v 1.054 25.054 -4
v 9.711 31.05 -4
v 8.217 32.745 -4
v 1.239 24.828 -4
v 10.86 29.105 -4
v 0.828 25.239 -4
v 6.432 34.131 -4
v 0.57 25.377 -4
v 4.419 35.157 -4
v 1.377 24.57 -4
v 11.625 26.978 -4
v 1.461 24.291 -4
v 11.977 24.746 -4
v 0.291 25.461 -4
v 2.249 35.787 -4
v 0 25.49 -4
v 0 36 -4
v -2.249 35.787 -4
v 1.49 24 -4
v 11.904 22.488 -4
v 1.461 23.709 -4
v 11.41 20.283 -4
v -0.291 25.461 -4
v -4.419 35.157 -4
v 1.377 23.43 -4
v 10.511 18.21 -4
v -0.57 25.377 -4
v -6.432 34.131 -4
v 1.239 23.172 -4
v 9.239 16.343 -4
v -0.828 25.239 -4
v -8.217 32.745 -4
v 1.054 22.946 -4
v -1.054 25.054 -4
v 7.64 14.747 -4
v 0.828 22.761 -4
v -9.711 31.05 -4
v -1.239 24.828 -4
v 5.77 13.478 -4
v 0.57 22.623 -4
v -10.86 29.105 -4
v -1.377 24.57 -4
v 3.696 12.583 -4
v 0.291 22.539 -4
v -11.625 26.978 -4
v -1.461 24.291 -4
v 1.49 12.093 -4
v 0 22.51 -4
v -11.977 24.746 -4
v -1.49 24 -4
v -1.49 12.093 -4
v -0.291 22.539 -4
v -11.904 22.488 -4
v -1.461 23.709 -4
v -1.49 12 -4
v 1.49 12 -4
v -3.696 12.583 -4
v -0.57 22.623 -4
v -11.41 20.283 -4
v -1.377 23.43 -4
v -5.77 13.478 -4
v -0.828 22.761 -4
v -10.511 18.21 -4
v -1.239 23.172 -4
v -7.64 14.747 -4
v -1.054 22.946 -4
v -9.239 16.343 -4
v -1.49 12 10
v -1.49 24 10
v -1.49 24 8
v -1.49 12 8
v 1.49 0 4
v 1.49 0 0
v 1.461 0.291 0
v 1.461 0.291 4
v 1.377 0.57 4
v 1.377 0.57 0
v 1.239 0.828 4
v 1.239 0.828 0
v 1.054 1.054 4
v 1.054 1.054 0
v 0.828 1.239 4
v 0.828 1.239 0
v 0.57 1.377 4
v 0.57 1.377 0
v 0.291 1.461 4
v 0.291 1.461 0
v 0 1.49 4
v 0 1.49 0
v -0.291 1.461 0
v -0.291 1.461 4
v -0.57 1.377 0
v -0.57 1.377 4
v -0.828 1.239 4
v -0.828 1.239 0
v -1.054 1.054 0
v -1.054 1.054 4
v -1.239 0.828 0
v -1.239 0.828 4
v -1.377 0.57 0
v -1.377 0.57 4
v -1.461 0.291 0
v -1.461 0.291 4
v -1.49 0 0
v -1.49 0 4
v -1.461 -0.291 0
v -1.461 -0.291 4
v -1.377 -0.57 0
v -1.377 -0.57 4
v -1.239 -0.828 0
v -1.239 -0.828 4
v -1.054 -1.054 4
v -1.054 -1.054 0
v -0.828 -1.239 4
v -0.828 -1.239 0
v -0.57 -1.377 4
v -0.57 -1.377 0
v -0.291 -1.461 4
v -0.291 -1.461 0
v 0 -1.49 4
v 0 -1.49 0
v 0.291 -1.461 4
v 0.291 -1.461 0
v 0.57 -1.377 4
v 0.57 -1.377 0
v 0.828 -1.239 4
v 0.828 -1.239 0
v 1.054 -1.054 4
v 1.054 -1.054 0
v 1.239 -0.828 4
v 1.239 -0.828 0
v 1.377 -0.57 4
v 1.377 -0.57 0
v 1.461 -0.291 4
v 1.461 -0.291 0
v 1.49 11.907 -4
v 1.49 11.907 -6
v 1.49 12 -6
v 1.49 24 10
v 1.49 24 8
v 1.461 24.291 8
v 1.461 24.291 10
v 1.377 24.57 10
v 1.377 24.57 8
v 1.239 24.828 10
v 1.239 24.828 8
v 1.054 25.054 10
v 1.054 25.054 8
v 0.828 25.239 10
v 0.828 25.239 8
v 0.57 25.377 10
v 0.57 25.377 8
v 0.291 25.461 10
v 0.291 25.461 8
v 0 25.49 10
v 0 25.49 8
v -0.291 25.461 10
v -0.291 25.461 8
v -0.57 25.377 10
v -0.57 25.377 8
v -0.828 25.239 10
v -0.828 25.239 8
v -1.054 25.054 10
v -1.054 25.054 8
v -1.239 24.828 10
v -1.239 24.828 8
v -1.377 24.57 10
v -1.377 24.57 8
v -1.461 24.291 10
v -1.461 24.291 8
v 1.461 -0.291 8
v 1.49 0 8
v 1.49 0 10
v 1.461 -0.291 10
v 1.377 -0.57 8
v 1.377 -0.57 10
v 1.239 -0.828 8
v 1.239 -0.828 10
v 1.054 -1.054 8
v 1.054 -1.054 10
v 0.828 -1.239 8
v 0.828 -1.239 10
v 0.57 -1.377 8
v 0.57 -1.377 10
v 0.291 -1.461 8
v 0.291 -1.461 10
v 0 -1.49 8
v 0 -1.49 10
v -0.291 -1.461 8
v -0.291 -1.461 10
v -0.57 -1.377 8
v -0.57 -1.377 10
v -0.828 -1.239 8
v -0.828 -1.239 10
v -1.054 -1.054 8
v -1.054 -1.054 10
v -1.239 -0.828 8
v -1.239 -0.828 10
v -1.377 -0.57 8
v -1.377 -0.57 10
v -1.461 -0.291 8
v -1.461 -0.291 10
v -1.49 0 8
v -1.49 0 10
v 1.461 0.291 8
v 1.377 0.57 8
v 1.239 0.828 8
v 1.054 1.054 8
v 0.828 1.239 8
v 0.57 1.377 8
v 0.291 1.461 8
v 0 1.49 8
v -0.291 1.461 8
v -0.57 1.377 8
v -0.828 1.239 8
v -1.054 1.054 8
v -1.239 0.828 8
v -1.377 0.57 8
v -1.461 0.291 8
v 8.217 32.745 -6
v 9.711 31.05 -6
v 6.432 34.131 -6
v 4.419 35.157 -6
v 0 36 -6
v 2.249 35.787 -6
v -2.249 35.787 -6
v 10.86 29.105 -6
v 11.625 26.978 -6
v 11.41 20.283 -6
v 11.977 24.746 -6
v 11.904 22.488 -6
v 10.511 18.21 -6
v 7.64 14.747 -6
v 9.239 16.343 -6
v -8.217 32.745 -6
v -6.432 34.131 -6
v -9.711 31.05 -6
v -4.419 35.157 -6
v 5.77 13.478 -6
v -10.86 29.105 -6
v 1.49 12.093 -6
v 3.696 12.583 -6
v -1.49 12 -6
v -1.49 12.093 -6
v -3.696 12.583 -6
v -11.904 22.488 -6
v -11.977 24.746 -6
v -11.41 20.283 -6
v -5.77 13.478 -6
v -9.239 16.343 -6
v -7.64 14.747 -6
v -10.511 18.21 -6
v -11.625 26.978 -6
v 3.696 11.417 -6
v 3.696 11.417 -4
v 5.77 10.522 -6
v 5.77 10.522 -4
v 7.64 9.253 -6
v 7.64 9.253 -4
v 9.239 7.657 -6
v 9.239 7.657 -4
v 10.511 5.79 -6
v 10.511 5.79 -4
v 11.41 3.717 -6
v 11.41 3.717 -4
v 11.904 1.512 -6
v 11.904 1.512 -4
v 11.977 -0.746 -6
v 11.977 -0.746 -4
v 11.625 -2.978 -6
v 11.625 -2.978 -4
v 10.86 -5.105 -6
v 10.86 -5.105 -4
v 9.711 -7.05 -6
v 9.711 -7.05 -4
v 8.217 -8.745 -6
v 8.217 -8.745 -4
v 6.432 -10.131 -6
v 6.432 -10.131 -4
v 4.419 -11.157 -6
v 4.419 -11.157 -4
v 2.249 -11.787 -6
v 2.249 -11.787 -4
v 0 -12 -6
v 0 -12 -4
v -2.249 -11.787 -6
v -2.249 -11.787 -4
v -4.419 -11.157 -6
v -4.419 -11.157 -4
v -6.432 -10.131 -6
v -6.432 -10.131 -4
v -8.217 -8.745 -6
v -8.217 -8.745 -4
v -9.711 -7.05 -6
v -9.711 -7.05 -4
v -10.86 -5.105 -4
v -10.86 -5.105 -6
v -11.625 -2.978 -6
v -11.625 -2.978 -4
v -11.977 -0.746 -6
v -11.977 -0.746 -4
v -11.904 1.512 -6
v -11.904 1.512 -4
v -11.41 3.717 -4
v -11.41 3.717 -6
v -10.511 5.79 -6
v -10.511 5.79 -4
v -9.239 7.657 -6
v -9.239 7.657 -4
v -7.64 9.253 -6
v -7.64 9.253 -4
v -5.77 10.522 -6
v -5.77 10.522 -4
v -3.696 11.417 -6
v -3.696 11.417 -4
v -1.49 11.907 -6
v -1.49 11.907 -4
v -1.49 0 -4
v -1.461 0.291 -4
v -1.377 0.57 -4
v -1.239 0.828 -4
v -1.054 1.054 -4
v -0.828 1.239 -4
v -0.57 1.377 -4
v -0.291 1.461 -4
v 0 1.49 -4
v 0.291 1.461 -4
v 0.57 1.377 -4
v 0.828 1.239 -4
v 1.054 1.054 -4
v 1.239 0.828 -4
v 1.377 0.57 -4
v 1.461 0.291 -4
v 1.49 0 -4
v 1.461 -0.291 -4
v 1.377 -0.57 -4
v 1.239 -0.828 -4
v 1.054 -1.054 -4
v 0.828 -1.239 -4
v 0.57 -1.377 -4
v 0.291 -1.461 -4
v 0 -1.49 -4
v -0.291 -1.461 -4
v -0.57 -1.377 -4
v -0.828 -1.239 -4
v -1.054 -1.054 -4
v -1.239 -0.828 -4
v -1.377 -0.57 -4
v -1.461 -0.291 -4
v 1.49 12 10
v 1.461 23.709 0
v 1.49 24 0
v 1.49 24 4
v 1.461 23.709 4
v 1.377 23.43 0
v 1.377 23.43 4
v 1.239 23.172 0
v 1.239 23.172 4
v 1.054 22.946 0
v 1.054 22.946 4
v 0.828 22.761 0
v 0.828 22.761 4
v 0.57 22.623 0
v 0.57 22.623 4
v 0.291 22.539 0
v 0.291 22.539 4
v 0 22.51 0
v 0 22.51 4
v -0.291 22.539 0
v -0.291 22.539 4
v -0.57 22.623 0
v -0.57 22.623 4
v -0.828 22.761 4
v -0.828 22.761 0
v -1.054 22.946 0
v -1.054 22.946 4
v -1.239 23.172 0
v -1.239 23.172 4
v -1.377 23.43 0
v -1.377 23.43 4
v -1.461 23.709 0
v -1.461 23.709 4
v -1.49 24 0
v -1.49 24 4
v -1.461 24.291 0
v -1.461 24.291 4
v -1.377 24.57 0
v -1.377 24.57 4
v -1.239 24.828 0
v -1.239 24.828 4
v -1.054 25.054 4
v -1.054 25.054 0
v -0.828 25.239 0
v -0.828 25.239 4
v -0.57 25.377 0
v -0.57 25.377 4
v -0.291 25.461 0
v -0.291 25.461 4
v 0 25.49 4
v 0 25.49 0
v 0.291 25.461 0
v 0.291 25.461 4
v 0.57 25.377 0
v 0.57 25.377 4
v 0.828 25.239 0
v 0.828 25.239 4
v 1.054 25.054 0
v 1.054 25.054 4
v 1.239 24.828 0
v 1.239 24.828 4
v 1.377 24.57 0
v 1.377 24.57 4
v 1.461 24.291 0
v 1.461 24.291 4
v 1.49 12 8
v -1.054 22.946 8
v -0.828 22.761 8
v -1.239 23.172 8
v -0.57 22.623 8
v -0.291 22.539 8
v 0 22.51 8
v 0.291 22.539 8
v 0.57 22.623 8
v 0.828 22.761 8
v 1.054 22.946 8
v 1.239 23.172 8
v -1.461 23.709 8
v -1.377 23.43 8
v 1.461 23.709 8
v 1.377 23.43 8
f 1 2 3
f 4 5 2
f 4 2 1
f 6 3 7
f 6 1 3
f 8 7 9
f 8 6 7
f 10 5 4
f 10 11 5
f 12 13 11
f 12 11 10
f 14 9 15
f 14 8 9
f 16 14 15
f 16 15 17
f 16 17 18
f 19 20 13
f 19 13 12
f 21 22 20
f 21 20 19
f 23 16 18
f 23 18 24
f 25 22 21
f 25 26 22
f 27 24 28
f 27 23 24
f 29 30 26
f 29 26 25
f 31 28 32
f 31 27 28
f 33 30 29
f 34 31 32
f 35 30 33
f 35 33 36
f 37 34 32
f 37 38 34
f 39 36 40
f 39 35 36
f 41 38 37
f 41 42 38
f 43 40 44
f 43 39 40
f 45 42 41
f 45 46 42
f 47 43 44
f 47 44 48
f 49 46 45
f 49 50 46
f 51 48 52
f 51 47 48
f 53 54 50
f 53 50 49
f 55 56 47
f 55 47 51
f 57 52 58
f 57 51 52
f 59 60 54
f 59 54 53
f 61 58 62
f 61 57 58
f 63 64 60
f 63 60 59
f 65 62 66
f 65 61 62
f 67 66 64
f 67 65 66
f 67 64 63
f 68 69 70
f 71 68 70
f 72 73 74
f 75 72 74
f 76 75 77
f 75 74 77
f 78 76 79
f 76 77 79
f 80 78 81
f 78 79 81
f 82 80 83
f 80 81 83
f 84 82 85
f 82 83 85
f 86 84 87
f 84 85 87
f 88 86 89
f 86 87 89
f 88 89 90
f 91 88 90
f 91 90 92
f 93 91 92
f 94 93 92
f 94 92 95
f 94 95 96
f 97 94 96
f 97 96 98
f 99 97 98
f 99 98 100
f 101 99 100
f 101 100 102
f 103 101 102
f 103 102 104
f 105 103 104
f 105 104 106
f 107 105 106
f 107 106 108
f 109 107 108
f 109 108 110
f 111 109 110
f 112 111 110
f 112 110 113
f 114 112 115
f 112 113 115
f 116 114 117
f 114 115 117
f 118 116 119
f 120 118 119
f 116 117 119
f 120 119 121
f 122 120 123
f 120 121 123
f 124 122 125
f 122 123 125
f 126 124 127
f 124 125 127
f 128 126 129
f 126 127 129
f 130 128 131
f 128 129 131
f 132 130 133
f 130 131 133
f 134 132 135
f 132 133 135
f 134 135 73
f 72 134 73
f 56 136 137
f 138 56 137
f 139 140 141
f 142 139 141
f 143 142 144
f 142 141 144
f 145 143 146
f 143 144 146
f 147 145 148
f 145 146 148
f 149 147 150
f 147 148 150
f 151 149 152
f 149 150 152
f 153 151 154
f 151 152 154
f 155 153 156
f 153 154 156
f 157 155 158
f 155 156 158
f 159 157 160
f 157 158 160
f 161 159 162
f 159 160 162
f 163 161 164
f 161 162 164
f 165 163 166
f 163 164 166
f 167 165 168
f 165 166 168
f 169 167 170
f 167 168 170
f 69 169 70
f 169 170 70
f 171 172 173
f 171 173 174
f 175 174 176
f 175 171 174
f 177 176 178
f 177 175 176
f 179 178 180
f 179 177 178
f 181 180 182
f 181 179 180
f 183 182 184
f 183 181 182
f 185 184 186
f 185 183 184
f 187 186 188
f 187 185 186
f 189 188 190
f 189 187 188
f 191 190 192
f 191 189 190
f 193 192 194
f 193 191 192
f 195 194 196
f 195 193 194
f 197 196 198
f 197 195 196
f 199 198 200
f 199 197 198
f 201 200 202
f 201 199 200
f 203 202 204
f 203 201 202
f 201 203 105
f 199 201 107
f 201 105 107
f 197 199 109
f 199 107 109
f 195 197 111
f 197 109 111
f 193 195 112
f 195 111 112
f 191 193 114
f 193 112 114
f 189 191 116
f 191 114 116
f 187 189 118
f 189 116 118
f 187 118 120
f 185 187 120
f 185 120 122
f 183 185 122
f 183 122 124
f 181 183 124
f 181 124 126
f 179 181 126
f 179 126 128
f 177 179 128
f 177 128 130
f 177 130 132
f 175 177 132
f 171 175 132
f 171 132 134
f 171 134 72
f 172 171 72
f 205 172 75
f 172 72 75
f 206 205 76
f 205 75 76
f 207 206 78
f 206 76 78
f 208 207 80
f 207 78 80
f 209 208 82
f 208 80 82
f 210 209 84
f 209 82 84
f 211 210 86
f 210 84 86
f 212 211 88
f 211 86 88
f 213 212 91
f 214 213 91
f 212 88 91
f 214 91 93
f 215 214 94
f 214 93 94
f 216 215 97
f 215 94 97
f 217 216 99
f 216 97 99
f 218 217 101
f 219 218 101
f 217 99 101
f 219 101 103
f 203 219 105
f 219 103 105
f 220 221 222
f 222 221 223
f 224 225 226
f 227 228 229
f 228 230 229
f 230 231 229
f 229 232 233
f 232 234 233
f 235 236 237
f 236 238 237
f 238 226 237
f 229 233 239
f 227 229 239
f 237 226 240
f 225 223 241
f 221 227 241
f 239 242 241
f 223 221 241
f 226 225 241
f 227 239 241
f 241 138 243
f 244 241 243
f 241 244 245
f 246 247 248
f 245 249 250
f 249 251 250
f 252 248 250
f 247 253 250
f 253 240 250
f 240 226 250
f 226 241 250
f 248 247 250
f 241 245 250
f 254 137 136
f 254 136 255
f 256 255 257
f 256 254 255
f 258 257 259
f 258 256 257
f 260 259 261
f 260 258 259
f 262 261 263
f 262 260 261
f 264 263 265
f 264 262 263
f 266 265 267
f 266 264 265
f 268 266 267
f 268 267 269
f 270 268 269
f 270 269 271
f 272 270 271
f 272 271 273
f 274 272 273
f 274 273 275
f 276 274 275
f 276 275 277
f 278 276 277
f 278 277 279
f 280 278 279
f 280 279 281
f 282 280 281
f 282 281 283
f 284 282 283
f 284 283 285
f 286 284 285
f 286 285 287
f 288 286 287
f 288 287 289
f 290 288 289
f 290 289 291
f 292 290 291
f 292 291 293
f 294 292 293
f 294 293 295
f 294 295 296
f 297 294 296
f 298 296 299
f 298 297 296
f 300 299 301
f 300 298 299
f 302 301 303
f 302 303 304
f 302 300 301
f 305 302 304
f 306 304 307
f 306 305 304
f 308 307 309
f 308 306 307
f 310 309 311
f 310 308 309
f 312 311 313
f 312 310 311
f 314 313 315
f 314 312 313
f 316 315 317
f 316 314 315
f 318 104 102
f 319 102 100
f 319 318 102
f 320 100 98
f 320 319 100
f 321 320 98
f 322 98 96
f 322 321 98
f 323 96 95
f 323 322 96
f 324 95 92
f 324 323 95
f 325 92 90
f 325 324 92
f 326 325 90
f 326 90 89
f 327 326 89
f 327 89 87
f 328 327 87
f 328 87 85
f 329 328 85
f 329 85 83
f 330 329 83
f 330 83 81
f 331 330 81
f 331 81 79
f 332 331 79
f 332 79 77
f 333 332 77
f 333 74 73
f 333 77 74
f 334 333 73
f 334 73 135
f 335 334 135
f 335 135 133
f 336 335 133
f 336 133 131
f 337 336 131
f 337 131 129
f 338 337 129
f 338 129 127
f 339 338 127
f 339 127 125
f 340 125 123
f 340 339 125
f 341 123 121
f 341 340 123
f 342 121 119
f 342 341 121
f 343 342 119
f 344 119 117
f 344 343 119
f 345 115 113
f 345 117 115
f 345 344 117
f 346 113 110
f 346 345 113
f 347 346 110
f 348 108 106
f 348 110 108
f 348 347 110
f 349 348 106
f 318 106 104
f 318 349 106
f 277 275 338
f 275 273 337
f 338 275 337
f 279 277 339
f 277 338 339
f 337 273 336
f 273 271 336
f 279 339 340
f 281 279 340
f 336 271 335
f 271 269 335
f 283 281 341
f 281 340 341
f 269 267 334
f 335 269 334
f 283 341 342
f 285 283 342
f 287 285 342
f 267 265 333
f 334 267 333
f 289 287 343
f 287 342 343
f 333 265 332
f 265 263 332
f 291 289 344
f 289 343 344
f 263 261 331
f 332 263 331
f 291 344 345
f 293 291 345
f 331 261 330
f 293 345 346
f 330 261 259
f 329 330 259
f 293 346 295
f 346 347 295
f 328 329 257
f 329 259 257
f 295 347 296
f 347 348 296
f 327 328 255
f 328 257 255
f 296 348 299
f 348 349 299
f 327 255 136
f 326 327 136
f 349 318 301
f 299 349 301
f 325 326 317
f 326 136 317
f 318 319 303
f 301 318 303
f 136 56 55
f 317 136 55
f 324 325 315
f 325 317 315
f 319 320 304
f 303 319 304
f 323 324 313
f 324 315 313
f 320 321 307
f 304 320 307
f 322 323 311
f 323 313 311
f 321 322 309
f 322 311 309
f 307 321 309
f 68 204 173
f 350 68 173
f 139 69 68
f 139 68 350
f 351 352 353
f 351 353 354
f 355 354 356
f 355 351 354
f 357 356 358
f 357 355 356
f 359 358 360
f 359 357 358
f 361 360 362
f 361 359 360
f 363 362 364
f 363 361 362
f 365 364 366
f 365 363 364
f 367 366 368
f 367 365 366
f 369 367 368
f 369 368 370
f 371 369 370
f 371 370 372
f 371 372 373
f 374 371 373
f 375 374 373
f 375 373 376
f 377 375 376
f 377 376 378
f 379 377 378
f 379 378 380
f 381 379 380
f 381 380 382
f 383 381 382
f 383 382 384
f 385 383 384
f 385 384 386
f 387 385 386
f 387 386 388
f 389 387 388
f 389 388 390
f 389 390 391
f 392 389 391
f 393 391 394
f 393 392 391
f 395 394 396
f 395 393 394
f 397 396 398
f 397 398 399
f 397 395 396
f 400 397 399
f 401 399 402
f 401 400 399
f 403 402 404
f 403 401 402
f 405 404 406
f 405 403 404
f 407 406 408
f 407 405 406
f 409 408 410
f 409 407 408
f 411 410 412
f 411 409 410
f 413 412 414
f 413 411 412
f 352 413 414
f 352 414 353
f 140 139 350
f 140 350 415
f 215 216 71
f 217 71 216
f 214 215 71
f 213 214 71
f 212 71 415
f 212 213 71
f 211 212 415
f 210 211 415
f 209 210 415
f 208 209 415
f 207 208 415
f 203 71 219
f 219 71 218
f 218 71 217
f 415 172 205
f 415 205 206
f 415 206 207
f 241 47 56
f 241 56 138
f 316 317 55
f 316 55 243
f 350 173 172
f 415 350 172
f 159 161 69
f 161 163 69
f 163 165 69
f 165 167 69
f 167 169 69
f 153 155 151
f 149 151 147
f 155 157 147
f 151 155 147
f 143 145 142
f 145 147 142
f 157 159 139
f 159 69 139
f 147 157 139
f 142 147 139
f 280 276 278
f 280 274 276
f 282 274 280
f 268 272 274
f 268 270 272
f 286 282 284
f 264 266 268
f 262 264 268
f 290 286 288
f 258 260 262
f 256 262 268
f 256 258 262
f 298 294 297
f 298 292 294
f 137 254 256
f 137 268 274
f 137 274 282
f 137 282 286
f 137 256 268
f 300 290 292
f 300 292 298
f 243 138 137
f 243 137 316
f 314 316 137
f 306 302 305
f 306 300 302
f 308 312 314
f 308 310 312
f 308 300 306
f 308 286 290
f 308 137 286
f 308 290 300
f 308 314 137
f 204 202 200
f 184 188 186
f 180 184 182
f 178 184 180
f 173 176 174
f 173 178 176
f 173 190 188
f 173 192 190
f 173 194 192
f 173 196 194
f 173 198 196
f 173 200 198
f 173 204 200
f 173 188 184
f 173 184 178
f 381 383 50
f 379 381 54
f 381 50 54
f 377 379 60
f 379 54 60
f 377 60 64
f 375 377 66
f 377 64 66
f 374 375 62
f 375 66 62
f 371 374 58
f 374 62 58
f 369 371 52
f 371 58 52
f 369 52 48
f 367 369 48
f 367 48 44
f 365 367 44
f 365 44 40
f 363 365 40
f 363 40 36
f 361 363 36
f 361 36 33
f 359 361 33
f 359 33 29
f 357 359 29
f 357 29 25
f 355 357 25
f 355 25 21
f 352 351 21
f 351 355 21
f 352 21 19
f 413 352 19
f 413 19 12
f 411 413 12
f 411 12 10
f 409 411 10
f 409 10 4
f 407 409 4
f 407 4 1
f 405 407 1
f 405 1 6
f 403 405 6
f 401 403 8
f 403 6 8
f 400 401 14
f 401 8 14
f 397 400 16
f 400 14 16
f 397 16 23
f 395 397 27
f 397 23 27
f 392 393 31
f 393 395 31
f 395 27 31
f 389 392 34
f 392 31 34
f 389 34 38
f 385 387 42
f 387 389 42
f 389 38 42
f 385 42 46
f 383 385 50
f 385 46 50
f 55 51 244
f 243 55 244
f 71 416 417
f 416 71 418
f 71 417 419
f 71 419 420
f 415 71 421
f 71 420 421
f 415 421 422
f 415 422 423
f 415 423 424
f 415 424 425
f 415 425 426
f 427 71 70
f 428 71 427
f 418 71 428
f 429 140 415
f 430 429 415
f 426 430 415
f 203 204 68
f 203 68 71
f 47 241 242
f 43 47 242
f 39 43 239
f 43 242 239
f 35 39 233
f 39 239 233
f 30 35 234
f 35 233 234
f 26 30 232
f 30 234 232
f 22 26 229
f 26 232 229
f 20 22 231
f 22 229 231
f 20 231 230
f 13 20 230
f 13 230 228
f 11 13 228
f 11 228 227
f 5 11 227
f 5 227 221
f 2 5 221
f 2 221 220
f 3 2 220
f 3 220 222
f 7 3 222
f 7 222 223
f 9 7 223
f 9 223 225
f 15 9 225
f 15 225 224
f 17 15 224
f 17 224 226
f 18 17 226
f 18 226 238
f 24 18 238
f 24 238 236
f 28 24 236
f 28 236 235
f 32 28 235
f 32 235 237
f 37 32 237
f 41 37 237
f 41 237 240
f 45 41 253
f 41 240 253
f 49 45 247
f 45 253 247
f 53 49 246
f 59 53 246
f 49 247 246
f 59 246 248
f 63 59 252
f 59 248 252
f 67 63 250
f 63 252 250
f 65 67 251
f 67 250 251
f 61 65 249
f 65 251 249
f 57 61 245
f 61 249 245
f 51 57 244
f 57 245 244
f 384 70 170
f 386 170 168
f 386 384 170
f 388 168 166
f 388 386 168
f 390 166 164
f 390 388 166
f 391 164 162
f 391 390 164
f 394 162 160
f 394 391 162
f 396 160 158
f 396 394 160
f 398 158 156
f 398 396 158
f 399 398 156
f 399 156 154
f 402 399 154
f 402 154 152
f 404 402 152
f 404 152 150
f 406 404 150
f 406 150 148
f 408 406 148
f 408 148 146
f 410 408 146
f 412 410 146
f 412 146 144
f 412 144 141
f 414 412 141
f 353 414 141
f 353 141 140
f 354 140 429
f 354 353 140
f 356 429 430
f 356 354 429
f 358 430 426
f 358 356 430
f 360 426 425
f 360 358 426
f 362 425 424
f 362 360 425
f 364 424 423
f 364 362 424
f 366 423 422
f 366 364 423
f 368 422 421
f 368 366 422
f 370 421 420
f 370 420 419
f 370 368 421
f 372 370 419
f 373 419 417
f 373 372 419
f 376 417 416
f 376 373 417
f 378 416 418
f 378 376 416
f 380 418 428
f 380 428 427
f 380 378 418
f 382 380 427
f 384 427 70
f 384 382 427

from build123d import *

# Parameters (mm, degrees)
SKETCH_1_R                       = 1.49
EXTRUDE_1_DEPTH                  = 4
EXTRUDE_START                    = 4
SKETCH_2_R                       = 1.49
EXTRUDE_2_DEPTH                  = 4
SKETCH_3_R                       = 1.49
EXTRUDE_3_DEPTH                  = 4
SKETCH_4_W                       = 2.98
SKETCH_4_H                       = 2
EXTRUDE_4_DEPTH                  = 12
EXTRUDE_4_DIRECTION_2_REACH      = 10.273
EXTRUDE_4_DIRECTION_2_END_RADIUS = 1.49
SKETCH_9_R                       = 12
EXTRUDE_6_DEPTH                  = 2
SKETCH_6_W                       = 2.98
SKETCH_6_H                       = 2
EXTRUDE_5_DEPTH                  = 12
EXTRUDE_5_DIRECTION_2_REACH      = 20.762
EXTRUDE_5_DIRECTION_2_END_RADIUS = 1.49


with BuildPart() as part:
    # 草图1 → 凸台-拉伸1 (new body)
    with BuildSketch(Plane.XY):
        Circle(SKETCH_1_R)
    extrude(amount=EXTRUDE_1_DEPTH)

    # 草图2 → 凸台-拉伸2 (add)
    with BuildSketch(Plane(origin=(0, 0, 0), x_dir=(-1, 0, 0), z_dir=(0, 0, -1)).offset(EXTRUDE_START)):
        Circle(SKETCH_2_R)
    extrude(amount=-EXTRUDE_2_DEPTH)

    # 草图3 → 凸台-拉伸3 (add)
    with BuildSketch(Plane.XY.offset(4)):
        with Locations(Location((0, 0, 0), (0, 0, 180))):
            Circle(SKETCH_3_R)
    extrude(amount=EXTRUDE_3_DEPTH)

    # 草图4 → 凸台-拉伸4 (add)
    with BuildSketch(Plane(origin=(0, 0, 0), x_dir=(1, 0, 0), z_dir=(0, 1, 0))):
        with Locations((0, 5)):
            Rectangle(SKETCH_4_W, SKETCH_4_H)
    extrude(amount=EXTRUDE_4_DEPTH)

    # 凸台-拉伸4 direction 2: up to this cylinder (the profile starts inside it)
    extrude_4_direction_2_end = Plane(origin=(0, 0, -5), z_dir=(0, 0, -1)) * Cylinder(EXTRUDE_4_DIRECTION_2_END_RADIUS, 24.526, mode=Mode.PRIVATE)
    # 草图4 → 凸台-拉伸4 direction 2 (add, up to the surface)
    with BuildSketch(Plane(origin=(0, 0, 0), x_dir=(1, 0, 0), z_dir=(0, 1, 0)), mode=Mode.PRIVATE) as extrude_4_direction_2_sk1:
        with Locations((0, 5)):
            Rectangle(SKETCH_4_W, SKETCH_4_H)
    extrude_4_direction_2_tool1 = extrude(extrude_4_direction_2_sk1.sketch, amount=-EXTRUDE_4_DIRECTION_2_REACH, mode=Mode.PRIVATE) & extrude_4_direction_2_end
    add(extrude_4_direction_2_tool1.solids().sort_by_distance((0, 0, -5))[0])

    # 草图9 → 凸台-拉伸6 (add)
    with BuildSketch(Plane(origin=(0, 0, -6), x_dir=(-1, 0, 0), z_dir=(0, 0, -1))):
        Circle(SKETCH_9_R)
    extrude(amount=-EXTRUDE_6_DEPTH)

    # 草图6 → 凸台-拉伸5 (add)
    with BuildSketch(Plane(origin=(0, 0, 0), x_dir=(1, 0, 0), z_dir=(0, 1, 0))):
        with Locations((0, -9)):
            Rectangle(SKETCH_6_W, SKETCH_6_H)
    extrude(amount=EXTRUDE_5_DEPTH)

    # 凸台-拉伸5 direction 2: up to this cylinder (the profile starts inside it)
    extrude_5_direction_2_end = Plane(origin=(0, 0, 9), z_dir=(0, 0, -1)) * Cylinder(EXTRUDE_5_DIRECTION_2_END_RADIUS, 45.504, mode=Mode.PRIVATE)
    # 草图6 → 凸台-拉伸5 direction 2 (add, up to the surface)
    with BuildSketch(Plane(origin=(0, 0, 0), x_dir=(1, 0, 0), z_dir=(0, 1, 0)), mode=Mode.PRIVATE) as extrude_5_direction_2_sk1:
        with Locations((0, -9)):
            Rectangle(SKETCH_6_W, SKETCH_6_H)
    extrude_5_direction_2_tool1 = extrude(extrude_5_direction_2_sk1.sketch, amount=-EXTRUDE_5_DIRECTION_2_REACH, mode=Mode.PRIVATE) & extrude_5_direction_2_end
    add(extrude_5_direction_2_tool1.solids().sort_by_distance((0, 0, 9))[0])

    # 镜向2: part across plane


with BuildPart() as part_1:
    add(part.part)
    add(part.part.mirror(Plane.ZX.offset(12)))


solid = part_1.part
